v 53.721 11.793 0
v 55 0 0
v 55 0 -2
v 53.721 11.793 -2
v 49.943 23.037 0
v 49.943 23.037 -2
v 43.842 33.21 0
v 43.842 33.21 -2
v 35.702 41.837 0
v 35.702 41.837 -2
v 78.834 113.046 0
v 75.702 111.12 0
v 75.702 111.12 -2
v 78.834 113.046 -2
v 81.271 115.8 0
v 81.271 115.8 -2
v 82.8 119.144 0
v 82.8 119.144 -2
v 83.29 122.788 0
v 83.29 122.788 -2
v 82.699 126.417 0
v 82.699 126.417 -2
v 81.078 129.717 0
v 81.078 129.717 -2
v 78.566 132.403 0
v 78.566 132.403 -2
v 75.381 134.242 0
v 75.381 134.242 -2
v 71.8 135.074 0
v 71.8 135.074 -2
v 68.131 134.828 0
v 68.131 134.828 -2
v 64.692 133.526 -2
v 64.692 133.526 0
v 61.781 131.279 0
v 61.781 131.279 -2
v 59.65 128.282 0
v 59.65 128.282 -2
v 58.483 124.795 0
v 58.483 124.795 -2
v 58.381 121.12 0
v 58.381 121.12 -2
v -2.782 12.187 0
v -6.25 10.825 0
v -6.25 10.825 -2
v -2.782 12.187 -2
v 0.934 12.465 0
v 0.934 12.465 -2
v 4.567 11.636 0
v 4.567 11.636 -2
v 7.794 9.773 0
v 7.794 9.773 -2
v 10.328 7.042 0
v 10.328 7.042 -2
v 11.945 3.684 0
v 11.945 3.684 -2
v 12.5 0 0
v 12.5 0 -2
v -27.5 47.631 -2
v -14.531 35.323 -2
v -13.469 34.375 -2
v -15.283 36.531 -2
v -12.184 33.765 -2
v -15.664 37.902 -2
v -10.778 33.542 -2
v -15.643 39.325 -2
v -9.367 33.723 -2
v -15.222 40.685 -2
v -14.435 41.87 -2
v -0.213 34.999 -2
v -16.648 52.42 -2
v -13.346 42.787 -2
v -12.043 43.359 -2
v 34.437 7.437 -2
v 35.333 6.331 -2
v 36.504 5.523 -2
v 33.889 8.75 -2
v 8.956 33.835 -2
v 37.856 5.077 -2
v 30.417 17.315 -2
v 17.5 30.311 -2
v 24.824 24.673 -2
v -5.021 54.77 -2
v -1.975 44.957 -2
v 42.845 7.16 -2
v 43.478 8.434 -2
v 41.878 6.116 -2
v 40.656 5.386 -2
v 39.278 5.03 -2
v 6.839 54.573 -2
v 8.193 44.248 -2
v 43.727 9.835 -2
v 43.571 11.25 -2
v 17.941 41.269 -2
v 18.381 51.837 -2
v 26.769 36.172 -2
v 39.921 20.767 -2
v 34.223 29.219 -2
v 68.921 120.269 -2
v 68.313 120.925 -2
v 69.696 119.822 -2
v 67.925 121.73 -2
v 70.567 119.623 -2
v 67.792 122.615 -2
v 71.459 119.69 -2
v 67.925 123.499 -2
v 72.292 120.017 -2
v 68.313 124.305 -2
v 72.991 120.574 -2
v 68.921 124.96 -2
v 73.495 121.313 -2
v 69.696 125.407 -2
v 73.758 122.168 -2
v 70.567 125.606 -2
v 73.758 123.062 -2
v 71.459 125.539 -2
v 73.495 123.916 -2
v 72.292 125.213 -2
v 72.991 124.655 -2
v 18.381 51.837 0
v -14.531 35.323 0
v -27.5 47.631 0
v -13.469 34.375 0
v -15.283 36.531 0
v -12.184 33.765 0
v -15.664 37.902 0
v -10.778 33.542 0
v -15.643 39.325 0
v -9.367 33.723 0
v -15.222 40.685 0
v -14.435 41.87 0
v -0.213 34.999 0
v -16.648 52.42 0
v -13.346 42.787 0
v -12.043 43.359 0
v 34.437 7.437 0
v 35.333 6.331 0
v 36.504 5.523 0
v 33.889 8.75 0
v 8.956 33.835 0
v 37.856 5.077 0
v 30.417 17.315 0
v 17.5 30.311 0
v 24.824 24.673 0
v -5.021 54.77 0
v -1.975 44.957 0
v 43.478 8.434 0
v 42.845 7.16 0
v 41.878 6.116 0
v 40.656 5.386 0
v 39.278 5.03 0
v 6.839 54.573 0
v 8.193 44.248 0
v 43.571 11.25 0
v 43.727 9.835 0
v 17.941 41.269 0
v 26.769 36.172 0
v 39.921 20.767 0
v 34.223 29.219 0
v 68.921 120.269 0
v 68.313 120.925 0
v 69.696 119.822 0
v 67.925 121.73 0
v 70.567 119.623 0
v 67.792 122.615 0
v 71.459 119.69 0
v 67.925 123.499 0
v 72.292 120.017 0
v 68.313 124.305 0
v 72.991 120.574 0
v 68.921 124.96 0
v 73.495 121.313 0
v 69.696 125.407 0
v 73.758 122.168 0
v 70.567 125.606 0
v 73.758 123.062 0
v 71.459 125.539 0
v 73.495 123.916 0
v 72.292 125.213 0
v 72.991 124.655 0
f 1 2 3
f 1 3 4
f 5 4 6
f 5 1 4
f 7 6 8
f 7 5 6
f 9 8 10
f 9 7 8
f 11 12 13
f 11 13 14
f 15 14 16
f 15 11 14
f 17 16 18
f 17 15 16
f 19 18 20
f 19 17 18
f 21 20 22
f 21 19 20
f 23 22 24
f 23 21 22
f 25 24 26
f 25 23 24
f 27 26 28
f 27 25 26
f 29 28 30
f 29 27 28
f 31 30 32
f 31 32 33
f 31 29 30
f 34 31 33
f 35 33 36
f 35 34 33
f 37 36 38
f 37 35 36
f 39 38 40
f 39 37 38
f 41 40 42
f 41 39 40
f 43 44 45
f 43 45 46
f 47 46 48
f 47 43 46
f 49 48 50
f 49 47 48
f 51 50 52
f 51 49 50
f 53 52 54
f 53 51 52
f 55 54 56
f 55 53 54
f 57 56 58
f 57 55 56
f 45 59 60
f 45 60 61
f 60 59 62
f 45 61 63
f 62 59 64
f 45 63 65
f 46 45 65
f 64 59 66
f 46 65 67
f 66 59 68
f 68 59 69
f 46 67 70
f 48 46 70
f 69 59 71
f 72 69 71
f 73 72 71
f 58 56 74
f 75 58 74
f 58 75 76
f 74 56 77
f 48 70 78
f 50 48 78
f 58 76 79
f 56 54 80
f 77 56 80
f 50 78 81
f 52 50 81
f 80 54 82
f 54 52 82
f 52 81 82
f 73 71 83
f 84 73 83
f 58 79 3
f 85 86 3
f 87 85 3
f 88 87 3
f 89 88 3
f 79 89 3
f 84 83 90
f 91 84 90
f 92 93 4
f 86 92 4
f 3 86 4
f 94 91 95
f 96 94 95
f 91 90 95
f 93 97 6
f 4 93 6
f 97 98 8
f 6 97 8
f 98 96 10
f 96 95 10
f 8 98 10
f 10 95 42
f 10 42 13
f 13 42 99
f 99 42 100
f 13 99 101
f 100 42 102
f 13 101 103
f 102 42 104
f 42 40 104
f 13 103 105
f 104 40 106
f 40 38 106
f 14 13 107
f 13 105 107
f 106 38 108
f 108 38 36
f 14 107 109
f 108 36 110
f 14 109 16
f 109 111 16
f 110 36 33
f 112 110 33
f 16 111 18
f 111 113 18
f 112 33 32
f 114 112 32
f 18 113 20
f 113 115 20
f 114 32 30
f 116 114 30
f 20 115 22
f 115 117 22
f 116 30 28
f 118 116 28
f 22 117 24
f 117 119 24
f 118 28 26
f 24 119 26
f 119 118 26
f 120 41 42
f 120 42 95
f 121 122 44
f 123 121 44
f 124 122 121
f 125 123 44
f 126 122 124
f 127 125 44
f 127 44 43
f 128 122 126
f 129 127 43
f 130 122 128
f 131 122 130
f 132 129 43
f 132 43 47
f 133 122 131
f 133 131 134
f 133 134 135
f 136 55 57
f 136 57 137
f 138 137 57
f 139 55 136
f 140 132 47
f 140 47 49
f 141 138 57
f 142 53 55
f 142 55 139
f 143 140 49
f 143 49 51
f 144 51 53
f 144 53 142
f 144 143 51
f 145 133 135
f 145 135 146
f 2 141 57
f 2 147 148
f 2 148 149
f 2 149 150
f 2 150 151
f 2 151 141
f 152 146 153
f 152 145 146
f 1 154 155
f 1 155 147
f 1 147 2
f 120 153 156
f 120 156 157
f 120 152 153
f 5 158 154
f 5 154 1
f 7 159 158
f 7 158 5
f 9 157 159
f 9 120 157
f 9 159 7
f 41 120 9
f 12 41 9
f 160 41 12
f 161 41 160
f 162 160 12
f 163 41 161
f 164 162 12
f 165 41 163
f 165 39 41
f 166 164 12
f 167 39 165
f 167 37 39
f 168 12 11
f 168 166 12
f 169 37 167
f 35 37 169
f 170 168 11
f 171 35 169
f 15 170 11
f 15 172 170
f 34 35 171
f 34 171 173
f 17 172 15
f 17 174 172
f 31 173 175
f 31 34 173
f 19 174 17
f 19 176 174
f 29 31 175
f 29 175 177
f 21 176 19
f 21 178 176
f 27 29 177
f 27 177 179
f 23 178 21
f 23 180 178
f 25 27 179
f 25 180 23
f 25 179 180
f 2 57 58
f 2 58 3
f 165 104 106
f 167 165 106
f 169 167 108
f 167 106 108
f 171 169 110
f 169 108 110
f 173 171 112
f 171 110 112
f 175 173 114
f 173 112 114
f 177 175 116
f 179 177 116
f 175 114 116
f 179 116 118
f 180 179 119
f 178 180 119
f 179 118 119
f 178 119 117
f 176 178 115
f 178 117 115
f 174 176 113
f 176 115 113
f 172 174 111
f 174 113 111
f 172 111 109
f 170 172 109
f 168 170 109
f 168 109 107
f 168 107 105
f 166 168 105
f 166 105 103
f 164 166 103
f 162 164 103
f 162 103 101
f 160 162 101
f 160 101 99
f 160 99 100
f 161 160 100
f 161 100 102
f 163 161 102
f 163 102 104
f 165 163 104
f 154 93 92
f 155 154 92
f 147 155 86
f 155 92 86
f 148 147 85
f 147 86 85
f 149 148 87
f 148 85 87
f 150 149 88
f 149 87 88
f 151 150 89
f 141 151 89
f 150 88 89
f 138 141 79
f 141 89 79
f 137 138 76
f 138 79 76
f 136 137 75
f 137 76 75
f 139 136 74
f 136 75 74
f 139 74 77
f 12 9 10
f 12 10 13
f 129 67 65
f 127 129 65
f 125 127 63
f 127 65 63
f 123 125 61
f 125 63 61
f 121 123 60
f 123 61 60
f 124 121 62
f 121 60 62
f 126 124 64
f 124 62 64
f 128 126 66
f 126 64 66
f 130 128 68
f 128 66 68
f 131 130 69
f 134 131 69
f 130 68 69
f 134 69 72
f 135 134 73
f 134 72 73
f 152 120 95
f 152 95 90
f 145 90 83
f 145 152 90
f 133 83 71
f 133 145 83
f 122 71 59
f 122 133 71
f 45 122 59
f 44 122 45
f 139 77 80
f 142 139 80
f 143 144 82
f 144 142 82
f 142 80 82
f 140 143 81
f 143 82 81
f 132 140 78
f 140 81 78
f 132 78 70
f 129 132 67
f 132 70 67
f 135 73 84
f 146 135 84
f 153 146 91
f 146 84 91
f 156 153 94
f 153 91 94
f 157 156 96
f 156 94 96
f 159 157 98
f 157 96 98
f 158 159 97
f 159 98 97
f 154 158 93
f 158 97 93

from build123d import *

# Parameters (mm, degrees)
BASE_FLANGE1_DEPTH = 2
CUT_EXTRUDE1_DEPTH = 10
SKETCH9_R          = 3
CUT_EXTRUDE2_DEPTH = 10


# Sheet-metal steps are written as plain solids
with BuildPart() as part:
    # Sketch1 → Base-Flange1 (new body)
    with BuildSketch(Plane.XY):
        with BuildLine():
            Line((12.5, 0), (55, 0))
            ThreePointArc((55, 0), (49.942986861, 23.036884846), (35.701888604, 41.837484988))
            Line((35.701888604, 41.837484988), (75.701888604, 111.119517291))
            ThreePointArc((75.701888604, 111.119517291), (77.041634566, 133.440025366), (58.381380528, 121.119517291))
            Line((58.381380528, 121.119517291), (18.381380528, 51.837484988))
            ThreePointArc((18.381380528, 51.837484988), (-5.02096593, 54.770337785), (-27.5, 47.631397208))
            Line((-27.5, 47.631397208), (-6.25, 10.825317547))
            ThreePointArc((-6.25, 10.825317547), (6.25, 10.825317547), (12.5, 0))
        make_face()
    extrude(amount=-BASE_FLANGE1_DEPTH)

    # Sketch6 → Cut-Extrude1 (cut)
    with BuildSketch(Plane(origin=(0, 0, -2), x_dir=(-1, 0, 0), z_dir=(0, 0, -1))):
        with BuildLine():
            ThreePointArc((12.04274553, 43.35864712), (-22.5, 38.97114317), (-43.571062645, 11.25))
            ThreePointArc((-43.571062645, 11.25), (-39.979833462, 5.158770817), (-33.888604279, 8.75))
            ThreePointArc((-33.888604279, 8.75), (-17.5, 30.310889132), (9.366579857, 33.723392205))
            ThreePointArc((9.366579857, 33.723392205), (15.522290151, 37.202936826), (12.04274553, 43.35864712))
        make_face()
    extrude(amount=-CUT_EXTRUDE1_DEPTH, mode=Mode.SUBTRACT)

    # Sketch9 → Cut-Extrude2 (cut)
    with BuildSketch(Plane(origin=(0, 0, -2), x_dir=(-1, 0, 0), z_dir=(0, 0, -1))):
        with Locations((-70.791634566, 122.614707819)):
            Circle(SKETCH9_R)
    extrude(amount=-CUT_EXTRUDE2_DEPTH, mode=Mode.SUBTRACT)


solid = part.part
